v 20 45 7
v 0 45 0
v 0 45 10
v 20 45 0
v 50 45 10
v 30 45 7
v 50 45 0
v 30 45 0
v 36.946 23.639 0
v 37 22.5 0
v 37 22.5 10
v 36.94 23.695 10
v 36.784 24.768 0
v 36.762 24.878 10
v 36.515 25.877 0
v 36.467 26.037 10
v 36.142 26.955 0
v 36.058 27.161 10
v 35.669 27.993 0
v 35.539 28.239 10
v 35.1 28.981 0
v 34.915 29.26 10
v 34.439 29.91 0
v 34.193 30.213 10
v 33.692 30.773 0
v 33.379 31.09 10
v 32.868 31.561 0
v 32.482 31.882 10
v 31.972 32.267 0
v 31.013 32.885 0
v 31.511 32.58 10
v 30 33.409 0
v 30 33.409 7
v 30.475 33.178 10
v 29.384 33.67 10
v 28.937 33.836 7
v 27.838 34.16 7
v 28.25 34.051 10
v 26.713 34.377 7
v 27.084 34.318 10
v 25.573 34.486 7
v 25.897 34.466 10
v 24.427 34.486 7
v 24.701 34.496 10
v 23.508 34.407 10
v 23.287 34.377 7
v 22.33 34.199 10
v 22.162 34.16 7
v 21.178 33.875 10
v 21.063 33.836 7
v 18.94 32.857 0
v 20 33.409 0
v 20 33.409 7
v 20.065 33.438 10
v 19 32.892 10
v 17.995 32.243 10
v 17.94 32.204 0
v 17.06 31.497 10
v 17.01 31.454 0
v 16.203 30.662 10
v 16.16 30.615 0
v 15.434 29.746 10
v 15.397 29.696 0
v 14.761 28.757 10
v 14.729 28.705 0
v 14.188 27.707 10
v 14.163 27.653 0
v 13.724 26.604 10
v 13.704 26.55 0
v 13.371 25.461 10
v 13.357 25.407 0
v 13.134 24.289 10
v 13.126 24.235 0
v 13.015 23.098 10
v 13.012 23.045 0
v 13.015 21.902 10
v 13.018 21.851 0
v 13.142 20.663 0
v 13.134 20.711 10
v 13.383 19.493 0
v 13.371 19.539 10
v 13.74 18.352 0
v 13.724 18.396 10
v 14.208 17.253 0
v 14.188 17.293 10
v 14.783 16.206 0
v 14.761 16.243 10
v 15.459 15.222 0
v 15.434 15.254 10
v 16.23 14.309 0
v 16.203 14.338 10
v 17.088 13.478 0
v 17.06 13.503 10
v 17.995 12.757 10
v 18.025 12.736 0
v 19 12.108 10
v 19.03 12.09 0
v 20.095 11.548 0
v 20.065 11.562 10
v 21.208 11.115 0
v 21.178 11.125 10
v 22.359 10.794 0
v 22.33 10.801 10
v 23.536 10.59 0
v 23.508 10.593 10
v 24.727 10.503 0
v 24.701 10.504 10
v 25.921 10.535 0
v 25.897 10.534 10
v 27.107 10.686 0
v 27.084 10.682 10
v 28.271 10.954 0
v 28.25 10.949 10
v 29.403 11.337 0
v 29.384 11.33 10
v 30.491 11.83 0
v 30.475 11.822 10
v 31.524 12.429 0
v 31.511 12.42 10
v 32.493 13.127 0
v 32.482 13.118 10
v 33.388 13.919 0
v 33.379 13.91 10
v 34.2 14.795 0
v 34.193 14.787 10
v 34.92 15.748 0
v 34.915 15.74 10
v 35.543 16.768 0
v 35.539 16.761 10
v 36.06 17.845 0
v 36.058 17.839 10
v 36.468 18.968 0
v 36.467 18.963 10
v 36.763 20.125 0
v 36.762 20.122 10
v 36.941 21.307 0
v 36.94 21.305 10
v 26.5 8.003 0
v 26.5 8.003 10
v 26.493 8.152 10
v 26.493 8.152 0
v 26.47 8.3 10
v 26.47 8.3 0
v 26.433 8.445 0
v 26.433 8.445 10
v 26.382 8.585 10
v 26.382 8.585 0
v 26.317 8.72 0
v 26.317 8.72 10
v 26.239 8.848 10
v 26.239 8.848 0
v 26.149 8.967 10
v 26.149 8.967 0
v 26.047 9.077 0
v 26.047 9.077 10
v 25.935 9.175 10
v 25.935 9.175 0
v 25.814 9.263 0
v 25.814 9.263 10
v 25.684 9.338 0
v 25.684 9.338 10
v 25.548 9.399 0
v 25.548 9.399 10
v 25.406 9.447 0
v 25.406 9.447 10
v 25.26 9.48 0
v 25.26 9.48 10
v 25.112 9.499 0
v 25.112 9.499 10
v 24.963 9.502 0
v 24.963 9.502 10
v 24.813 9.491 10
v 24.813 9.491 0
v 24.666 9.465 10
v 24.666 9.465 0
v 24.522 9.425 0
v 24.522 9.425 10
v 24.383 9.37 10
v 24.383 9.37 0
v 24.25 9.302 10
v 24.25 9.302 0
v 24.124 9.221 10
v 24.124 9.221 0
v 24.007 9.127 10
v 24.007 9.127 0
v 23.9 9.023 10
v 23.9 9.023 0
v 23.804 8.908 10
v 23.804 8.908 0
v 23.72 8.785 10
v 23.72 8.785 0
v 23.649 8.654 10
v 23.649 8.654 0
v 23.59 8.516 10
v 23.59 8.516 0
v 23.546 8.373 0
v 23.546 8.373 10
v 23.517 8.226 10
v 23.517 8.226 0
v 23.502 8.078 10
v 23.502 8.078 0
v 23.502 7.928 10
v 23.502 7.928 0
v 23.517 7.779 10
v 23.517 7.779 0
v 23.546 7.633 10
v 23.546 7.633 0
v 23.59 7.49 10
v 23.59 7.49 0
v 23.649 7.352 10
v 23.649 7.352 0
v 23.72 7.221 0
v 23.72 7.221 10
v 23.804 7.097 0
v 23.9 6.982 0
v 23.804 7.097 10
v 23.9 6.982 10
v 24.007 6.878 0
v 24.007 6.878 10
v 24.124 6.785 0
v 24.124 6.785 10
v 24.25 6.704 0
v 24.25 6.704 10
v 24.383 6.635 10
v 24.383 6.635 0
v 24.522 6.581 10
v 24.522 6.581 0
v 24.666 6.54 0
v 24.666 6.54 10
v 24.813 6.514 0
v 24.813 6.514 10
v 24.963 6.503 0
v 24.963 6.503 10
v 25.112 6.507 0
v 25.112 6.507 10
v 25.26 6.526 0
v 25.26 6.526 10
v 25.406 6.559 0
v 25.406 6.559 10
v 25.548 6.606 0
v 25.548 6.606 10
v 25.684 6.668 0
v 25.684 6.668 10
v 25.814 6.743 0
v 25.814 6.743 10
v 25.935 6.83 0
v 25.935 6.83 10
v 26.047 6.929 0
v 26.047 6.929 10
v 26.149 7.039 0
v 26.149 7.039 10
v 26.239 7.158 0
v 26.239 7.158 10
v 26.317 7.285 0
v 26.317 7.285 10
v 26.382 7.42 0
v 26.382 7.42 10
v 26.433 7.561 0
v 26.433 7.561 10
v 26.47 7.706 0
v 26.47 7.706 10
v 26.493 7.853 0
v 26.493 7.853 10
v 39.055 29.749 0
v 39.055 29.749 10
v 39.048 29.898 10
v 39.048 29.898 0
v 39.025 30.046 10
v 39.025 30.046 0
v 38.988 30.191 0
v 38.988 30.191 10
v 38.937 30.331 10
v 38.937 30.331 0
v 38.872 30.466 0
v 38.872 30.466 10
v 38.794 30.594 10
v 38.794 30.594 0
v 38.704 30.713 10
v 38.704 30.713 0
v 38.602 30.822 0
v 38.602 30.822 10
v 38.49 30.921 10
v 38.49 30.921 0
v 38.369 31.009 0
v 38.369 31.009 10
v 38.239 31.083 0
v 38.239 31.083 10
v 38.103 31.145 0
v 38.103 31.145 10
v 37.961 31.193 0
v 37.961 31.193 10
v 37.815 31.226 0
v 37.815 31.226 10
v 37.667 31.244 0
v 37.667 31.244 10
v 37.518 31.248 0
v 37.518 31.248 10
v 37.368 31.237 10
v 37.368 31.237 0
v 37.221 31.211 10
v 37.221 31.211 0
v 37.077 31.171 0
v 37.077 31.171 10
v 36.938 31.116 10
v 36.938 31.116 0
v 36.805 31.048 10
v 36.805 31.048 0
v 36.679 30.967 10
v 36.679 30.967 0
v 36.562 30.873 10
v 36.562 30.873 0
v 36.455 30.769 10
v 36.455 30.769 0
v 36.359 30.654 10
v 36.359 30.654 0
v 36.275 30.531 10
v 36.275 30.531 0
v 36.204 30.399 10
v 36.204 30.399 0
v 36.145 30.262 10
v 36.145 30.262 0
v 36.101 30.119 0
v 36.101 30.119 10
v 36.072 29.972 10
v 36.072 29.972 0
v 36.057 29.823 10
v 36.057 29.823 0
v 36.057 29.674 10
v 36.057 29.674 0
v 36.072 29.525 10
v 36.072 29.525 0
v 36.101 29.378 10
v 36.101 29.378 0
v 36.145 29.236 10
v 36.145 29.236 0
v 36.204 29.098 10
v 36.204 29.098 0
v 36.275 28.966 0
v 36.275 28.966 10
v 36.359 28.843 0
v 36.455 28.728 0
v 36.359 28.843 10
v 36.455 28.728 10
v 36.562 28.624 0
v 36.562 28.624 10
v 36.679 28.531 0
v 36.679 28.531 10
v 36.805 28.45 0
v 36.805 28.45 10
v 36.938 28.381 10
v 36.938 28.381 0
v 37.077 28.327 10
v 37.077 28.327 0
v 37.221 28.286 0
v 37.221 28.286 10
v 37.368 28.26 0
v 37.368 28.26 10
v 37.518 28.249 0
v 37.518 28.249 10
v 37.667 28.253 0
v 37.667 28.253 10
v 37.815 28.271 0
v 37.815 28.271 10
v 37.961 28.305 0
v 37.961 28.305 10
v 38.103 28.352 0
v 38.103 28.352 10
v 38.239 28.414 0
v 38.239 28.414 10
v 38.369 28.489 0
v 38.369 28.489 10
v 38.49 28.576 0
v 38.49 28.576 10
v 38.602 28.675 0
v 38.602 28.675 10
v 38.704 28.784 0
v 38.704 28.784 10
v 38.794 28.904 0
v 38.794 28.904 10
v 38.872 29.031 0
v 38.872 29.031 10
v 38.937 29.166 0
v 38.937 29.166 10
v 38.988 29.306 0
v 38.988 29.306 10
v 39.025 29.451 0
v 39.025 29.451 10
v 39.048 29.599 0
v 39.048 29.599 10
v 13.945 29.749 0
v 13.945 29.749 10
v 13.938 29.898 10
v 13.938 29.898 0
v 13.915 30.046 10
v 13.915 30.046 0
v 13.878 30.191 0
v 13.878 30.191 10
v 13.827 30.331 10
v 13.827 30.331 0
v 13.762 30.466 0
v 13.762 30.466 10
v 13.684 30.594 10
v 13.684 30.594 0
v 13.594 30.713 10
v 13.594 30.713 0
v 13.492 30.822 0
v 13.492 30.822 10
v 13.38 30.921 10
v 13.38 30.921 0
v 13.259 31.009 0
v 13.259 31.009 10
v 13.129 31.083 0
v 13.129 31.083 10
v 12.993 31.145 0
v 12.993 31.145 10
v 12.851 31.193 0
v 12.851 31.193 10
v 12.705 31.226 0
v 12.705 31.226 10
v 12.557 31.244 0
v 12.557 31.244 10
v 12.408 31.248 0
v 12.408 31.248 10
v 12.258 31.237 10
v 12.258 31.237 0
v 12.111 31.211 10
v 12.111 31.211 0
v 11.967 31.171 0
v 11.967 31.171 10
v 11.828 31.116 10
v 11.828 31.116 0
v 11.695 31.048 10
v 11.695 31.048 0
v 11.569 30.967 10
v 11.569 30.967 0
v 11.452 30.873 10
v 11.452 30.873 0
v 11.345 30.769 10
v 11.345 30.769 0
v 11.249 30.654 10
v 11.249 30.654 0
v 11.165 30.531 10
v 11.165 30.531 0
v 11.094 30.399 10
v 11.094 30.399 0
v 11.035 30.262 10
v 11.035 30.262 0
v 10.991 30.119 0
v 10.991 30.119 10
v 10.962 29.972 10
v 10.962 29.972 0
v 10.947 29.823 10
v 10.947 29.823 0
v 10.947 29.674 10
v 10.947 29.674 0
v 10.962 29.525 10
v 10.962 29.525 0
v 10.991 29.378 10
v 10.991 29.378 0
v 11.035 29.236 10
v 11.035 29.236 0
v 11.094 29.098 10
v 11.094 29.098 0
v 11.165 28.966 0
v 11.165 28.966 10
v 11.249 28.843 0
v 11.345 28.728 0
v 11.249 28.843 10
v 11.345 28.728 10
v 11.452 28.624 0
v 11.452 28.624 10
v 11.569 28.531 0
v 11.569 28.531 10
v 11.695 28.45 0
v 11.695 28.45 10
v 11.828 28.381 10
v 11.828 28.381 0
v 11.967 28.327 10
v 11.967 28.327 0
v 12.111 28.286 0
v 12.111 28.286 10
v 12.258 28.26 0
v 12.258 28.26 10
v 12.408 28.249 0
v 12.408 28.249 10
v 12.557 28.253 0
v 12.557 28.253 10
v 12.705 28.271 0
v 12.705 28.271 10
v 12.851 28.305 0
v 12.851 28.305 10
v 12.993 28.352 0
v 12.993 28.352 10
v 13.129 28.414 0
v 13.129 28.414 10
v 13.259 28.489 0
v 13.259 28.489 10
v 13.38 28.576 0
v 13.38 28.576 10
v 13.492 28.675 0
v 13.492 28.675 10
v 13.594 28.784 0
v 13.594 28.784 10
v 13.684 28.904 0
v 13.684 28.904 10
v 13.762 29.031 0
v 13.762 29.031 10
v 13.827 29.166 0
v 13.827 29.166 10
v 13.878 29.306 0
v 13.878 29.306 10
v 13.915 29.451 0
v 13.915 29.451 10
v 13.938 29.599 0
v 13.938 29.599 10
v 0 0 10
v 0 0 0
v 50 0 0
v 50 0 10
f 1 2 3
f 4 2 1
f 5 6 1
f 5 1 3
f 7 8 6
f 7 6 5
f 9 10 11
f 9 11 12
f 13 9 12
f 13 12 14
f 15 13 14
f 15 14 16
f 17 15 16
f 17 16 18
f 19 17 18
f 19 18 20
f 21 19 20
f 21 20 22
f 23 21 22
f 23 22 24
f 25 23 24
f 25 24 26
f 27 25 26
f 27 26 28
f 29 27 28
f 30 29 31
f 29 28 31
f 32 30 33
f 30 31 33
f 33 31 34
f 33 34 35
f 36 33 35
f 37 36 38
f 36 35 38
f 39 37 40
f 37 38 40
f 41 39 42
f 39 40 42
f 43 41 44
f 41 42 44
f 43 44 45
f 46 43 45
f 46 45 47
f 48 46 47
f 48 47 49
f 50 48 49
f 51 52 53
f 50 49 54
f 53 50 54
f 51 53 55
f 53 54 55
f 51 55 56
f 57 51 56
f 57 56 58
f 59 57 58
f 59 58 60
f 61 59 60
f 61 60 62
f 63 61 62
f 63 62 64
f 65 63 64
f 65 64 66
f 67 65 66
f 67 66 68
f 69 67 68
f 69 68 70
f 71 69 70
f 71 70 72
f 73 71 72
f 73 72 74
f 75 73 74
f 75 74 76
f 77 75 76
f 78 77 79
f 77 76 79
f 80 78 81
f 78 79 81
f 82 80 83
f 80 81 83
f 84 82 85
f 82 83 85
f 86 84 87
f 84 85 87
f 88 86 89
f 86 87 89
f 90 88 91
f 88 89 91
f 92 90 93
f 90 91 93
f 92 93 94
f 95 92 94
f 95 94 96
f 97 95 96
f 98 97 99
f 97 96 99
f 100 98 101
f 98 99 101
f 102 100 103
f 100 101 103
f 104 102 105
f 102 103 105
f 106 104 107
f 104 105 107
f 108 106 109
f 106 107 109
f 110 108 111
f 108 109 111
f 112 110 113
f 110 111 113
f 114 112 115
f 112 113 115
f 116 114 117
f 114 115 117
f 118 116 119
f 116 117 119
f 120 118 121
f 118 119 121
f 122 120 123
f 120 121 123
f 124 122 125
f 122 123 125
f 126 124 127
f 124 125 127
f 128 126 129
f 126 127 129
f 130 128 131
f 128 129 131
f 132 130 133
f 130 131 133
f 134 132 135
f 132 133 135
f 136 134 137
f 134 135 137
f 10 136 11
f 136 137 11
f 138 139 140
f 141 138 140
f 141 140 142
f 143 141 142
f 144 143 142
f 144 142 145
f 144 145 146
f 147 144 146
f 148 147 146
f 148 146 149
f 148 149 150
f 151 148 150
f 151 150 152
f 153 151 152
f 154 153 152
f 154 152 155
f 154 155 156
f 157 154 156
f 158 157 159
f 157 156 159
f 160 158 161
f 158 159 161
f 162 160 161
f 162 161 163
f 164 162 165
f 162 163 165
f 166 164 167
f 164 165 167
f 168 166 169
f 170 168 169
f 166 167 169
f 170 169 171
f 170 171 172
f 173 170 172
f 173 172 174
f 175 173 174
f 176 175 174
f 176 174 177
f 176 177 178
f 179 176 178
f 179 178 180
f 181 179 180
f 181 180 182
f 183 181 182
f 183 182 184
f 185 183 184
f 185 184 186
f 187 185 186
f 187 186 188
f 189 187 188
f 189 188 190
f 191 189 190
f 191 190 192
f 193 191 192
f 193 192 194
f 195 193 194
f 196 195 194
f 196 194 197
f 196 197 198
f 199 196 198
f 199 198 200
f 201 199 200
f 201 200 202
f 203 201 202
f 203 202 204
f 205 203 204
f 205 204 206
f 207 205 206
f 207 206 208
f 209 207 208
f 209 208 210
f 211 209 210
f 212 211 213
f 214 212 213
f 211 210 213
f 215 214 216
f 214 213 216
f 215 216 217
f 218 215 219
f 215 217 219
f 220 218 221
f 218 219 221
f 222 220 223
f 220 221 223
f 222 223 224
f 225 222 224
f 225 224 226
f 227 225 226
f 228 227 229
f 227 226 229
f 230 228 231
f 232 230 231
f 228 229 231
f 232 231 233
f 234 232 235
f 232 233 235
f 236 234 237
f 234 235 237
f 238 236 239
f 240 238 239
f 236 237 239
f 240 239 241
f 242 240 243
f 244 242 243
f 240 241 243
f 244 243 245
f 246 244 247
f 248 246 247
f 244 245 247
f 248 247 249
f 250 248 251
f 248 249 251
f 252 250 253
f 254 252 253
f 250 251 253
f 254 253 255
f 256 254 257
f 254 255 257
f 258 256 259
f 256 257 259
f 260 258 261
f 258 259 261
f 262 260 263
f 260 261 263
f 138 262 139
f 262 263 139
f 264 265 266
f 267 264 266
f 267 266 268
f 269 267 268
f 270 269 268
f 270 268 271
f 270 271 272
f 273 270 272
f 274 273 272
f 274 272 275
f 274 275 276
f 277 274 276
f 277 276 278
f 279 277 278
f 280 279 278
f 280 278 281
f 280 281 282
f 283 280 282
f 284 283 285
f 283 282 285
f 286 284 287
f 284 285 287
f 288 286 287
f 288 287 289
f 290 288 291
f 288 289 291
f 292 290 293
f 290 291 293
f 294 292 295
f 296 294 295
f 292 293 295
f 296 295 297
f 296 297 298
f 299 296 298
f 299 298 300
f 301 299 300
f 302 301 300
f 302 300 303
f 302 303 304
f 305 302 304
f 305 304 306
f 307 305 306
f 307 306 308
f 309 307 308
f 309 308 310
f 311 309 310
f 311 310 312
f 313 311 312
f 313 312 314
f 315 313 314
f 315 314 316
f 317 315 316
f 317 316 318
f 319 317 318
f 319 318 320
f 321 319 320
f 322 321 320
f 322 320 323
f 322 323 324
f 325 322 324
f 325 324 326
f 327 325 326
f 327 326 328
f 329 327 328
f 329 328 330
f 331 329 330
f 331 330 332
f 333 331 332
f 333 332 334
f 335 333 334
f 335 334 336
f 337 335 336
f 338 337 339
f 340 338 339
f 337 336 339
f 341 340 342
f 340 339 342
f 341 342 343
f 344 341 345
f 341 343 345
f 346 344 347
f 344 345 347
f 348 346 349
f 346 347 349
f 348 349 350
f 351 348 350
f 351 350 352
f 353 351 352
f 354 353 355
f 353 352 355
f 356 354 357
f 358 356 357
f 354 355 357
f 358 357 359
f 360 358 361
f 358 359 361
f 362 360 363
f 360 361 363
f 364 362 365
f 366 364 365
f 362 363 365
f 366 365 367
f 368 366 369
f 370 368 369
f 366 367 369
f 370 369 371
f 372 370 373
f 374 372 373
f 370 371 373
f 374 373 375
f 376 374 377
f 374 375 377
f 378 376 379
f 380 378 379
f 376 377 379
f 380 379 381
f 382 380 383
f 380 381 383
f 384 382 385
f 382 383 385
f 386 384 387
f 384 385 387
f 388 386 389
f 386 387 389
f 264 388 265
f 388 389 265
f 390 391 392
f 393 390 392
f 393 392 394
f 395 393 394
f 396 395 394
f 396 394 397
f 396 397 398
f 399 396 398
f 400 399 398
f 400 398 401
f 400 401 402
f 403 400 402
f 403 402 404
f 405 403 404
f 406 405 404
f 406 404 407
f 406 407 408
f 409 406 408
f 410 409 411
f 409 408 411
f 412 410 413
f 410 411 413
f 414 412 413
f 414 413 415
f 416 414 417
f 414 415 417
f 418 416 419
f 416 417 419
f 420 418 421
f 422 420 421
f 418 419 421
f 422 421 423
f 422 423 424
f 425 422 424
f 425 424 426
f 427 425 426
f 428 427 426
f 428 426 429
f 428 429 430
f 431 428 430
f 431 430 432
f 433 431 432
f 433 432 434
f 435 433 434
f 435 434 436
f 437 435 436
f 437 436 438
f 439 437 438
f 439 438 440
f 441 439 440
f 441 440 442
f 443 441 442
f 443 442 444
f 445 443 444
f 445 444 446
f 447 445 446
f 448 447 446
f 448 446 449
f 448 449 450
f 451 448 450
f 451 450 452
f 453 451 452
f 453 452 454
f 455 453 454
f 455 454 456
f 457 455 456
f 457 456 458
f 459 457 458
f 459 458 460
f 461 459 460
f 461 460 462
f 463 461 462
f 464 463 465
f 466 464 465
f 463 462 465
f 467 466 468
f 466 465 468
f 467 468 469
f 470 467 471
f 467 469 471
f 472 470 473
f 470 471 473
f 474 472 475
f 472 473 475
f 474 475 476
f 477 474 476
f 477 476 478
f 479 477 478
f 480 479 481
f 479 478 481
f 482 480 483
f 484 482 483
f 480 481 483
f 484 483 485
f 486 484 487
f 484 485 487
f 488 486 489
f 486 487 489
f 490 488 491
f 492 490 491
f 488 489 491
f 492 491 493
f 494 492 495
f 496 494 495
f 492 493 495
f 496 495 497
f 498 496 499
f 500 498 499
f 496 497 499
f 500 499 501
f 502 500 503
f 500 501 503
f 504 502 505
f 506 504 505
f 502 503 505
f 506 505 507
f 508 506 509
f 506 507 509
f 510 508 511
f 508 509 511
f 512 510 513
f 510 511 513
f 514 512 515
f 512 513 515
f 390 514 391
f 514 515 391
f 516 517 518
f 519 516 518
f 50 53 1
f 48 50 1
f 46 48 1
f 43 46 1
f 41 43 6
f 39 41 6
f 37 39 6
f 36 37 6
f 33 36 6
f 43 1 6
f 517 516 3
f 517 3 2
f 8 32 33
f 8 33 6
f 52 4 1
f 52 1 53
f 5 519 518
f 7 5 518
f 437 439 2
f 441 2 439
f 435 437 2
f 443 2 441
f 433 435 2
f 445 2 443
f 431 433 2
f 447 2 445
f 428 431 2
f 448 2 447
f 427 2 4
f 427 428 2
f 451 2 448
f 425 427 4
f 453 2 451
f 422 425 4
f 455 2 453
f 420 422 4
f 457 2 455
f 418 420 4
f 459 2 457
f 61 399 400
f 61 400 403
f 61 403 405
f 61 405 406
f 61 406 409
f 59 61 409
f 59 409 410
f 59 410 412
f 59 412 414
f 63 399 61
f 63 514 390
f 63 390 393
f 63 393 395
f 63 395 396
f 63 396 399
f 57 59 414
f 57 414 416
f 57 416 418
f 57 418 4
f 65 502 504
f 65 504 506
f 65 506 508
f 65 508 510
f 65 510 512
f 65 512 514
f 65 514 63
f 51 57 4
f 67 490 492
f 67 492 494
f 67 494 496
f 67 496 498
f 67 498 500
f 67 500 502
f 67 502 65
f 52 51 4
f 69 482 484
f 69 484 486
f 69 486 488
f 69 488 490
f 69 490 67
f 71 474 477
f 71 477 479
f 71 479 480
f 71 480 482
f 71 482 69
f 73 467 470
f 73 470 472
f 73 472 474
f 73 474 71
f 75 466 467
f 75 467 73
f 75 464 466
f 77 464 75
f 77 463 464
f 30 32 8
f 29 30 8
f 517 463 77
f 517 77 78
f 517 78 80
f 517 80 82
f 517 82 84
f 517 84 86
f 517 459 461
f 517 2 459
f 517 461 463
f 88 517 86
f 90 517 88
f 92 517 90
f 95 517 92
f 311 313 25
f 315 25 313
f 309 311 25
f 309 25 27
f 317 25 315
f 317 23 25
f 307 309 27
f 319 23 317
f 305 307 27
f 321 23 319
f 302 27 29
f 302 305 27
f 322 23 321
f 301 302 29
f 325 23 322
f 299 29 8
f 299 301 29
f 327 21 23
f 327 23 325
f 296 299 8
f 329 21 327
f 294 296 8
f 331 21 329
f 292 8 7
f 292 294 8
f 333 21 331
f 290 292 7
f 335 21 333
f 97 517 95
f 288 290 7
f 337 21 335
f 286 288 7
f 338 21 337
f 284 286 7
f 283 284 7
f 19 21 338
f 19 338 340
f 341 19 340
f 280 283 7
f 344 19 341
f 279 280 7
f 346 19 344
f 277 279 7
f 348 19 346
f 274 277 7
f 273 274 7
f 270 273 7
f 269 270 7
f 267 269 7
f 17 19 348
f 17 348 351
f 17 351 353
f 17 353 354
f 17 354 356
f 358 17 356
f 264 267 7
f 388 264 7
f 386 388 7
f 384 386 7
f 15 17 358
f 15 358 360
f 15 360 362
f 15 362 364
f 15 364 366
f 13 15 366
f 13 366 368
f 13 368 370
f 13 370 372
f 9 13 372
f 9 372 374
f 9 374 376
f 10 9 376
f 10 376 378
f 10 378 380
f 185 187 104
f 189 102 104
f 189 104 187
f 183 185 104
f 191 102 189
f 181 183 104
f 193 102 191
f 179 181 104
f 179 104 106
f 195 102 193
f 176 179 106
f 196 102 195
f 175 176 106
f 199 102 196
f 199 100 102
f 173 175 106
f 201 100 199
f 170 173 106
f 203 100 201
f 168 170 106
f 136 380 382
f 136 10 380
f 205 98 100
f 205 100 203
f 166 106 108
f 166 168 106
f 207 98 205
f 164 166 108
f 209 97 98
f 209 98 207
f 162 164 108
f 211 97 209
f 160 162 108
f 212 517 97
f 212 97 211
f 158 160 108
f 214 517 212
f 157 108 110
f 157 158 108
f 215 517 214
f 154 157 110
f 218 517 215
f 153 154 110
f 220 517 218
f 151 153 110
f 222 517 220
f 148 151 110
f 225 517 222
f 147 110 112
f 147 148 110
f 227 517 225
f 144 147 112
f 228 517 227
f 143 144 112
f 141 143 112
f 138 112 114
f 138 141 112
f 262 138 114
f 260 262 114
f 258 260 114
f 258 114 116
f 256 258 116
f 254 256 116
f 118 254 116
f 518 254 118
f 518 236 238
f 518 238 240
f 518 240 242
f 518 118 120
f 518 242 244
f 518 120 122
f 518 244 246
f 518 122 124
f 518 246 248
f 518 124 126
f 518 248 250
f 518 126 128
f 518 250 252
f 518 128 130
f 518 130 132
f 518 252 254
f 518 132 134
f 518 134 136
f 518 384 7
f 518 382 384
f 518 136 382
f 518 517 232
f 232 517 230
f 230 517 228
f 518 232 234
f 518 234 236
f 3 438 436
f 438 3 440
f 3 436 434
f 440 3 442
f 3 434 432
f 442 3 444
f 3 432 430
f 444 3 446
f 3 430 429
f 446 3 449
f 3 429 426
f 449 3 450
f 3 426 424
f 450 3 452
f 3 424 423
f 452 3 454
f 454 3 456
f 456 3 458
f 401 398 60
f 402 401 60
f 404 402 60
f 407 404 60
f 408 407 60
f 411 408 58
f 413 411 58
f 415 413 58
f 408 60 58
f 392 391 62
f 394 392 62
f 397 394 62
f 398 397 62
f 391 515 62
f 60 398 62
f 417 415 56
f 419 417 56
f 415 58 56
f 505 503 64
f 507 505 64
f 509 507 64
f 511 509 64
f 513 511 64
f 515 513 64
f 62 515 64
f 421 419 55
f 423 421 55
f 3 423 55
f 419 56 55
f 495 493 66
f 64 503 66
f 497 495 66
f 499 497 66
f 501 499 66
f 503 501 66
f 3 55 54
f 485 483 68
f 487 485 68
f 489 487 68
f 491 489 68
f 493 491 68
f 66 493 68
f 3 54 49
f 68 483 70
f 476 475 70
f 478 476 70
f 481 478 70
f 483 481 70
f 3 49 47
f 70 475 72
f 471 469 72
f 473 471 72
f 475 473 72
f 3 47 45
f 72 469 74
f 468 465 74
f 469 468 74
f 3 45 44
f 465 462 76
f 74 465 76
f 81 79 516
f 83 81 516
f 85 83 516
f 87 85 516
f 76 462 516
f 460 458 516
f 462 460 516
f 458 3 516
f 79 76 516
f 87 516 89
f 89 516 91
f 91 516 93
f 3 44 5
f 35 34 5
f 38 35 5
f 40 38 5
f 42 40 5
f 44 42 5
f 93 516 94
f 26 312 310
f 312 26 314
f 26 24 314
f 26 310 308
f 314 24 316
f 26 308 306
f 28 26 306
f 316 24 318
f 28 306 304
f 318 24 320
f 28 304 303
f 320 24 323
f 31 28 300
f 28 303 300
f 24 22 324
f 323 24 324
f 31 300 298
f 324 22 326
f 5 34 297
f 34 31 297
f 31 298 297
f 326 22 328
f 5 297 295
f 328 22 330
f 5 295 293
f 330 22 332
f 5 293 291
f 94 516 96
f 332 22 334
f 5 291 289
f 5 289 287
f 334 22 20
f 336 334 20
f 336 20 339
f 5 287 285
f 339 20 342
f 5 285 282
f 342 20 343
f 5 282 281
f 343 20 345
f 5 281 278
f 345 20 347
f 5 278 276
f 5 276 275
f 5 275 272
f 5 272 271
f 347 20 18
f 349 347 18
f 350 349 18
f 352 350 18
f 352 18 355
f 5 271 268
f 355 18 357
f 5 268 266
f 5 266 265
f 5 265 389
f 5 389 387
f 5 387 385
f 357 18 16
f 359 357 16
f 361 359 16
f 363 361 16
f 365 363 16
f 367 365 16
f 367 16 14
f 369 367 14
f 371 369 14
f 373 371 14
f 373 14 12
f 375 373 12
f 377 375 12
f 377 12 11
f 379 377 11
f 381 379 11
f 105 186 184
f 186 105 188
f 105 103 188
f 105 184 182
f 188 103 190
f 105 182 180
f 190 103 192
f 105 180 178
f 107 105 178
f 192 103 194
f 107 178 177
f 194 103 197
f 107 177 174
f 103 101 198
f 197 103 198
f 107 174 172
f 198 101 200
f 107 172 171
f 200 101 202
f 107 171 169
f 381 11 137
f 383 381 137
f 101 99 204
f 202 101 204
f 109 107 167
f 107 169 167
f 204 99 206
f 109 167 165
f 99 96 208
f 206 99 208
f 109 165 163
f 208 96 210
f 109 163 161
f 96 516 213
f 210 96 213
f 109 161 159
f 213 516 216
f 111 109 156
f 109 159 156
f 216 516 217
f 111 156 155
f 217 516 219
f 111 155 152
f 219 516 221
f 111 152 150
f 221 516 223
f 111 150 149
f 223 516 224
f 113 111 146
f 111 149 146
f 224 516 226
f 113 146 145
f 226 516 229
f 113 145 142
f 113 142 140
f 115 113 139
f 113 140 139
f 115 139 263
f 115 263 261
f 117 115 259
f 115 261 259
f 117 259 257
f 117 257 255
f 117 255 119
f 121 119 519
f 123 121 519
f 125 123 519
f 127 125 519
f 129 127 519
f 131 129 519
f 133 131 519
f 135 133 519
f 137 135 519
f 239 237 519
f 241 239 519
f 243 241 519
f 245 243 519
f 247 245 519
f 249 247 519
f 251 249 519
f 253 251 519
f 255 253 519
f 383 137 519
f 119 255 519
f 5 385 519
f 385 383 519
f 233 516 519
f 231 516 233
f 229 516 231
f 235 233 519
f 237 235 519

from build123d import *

# Parameters (mm, degrees)
ESQUISSE1_W      = 50
ESQUISSE1_H      = 10
EXTRUSION1_DEPTH = 45
ESQUISSE2_R      = 12
ESQUISSE2_R_2    = 1.5
EXTRUSION2_DEPTH = 45
EXTRUSION5_DEPTH = 7


with BuildPart() as part:
    # Esquisse1 → Extrusion1 (new body)
    with BuildSketch(Plane(origin=(0, 0, 0), x_dir=(1, 0, 0), z_dir=(0, 1, 0))):
        with Locations((25, -5)):
            Rectangle(ESQUISSE1_W, ESQUISSE1_H)
    extrude(amount=EXTRUSION1_DEPTH)

    # Esquisse2 → Extrusion2 (cut)
    with BuildSketch(Plane.XY.offset(10)):
        with Locations((25, 22.5)):
            Circle(ESQUISSE2_R)
        with Locations((12.445, 29.74863263)):
            Circle(ESQUISSE2_R_2)
        with Locations((37.555, 29.74863263)):
            Circle(ESQUISSE2_R_2)
        with Locations((25, 8.002734741)):
            Circle(ESQUISSE2_R_2)
    extrude(amount=-EXTRUSION2_DEPTH, mode=Mode.SUBTRACT)

    # Esquisse3 → Extrusion5 (cut)
    with BuildSketch(Plane.XY):
        with BuildLine():
            Line((30, 33.408712115), (30, 45))
            Line((30, 45), (20, 45))
            Line((20, 45), (20, 33.408712115))
            ThreePointArc((20, 33.408712115), (25, 34.5), (30, 33.408712115))
        make_face()
    extrude(amount=EXTRUSION5_DEPTH, mode=Mode.SUBTRACT)


solid = part.part
